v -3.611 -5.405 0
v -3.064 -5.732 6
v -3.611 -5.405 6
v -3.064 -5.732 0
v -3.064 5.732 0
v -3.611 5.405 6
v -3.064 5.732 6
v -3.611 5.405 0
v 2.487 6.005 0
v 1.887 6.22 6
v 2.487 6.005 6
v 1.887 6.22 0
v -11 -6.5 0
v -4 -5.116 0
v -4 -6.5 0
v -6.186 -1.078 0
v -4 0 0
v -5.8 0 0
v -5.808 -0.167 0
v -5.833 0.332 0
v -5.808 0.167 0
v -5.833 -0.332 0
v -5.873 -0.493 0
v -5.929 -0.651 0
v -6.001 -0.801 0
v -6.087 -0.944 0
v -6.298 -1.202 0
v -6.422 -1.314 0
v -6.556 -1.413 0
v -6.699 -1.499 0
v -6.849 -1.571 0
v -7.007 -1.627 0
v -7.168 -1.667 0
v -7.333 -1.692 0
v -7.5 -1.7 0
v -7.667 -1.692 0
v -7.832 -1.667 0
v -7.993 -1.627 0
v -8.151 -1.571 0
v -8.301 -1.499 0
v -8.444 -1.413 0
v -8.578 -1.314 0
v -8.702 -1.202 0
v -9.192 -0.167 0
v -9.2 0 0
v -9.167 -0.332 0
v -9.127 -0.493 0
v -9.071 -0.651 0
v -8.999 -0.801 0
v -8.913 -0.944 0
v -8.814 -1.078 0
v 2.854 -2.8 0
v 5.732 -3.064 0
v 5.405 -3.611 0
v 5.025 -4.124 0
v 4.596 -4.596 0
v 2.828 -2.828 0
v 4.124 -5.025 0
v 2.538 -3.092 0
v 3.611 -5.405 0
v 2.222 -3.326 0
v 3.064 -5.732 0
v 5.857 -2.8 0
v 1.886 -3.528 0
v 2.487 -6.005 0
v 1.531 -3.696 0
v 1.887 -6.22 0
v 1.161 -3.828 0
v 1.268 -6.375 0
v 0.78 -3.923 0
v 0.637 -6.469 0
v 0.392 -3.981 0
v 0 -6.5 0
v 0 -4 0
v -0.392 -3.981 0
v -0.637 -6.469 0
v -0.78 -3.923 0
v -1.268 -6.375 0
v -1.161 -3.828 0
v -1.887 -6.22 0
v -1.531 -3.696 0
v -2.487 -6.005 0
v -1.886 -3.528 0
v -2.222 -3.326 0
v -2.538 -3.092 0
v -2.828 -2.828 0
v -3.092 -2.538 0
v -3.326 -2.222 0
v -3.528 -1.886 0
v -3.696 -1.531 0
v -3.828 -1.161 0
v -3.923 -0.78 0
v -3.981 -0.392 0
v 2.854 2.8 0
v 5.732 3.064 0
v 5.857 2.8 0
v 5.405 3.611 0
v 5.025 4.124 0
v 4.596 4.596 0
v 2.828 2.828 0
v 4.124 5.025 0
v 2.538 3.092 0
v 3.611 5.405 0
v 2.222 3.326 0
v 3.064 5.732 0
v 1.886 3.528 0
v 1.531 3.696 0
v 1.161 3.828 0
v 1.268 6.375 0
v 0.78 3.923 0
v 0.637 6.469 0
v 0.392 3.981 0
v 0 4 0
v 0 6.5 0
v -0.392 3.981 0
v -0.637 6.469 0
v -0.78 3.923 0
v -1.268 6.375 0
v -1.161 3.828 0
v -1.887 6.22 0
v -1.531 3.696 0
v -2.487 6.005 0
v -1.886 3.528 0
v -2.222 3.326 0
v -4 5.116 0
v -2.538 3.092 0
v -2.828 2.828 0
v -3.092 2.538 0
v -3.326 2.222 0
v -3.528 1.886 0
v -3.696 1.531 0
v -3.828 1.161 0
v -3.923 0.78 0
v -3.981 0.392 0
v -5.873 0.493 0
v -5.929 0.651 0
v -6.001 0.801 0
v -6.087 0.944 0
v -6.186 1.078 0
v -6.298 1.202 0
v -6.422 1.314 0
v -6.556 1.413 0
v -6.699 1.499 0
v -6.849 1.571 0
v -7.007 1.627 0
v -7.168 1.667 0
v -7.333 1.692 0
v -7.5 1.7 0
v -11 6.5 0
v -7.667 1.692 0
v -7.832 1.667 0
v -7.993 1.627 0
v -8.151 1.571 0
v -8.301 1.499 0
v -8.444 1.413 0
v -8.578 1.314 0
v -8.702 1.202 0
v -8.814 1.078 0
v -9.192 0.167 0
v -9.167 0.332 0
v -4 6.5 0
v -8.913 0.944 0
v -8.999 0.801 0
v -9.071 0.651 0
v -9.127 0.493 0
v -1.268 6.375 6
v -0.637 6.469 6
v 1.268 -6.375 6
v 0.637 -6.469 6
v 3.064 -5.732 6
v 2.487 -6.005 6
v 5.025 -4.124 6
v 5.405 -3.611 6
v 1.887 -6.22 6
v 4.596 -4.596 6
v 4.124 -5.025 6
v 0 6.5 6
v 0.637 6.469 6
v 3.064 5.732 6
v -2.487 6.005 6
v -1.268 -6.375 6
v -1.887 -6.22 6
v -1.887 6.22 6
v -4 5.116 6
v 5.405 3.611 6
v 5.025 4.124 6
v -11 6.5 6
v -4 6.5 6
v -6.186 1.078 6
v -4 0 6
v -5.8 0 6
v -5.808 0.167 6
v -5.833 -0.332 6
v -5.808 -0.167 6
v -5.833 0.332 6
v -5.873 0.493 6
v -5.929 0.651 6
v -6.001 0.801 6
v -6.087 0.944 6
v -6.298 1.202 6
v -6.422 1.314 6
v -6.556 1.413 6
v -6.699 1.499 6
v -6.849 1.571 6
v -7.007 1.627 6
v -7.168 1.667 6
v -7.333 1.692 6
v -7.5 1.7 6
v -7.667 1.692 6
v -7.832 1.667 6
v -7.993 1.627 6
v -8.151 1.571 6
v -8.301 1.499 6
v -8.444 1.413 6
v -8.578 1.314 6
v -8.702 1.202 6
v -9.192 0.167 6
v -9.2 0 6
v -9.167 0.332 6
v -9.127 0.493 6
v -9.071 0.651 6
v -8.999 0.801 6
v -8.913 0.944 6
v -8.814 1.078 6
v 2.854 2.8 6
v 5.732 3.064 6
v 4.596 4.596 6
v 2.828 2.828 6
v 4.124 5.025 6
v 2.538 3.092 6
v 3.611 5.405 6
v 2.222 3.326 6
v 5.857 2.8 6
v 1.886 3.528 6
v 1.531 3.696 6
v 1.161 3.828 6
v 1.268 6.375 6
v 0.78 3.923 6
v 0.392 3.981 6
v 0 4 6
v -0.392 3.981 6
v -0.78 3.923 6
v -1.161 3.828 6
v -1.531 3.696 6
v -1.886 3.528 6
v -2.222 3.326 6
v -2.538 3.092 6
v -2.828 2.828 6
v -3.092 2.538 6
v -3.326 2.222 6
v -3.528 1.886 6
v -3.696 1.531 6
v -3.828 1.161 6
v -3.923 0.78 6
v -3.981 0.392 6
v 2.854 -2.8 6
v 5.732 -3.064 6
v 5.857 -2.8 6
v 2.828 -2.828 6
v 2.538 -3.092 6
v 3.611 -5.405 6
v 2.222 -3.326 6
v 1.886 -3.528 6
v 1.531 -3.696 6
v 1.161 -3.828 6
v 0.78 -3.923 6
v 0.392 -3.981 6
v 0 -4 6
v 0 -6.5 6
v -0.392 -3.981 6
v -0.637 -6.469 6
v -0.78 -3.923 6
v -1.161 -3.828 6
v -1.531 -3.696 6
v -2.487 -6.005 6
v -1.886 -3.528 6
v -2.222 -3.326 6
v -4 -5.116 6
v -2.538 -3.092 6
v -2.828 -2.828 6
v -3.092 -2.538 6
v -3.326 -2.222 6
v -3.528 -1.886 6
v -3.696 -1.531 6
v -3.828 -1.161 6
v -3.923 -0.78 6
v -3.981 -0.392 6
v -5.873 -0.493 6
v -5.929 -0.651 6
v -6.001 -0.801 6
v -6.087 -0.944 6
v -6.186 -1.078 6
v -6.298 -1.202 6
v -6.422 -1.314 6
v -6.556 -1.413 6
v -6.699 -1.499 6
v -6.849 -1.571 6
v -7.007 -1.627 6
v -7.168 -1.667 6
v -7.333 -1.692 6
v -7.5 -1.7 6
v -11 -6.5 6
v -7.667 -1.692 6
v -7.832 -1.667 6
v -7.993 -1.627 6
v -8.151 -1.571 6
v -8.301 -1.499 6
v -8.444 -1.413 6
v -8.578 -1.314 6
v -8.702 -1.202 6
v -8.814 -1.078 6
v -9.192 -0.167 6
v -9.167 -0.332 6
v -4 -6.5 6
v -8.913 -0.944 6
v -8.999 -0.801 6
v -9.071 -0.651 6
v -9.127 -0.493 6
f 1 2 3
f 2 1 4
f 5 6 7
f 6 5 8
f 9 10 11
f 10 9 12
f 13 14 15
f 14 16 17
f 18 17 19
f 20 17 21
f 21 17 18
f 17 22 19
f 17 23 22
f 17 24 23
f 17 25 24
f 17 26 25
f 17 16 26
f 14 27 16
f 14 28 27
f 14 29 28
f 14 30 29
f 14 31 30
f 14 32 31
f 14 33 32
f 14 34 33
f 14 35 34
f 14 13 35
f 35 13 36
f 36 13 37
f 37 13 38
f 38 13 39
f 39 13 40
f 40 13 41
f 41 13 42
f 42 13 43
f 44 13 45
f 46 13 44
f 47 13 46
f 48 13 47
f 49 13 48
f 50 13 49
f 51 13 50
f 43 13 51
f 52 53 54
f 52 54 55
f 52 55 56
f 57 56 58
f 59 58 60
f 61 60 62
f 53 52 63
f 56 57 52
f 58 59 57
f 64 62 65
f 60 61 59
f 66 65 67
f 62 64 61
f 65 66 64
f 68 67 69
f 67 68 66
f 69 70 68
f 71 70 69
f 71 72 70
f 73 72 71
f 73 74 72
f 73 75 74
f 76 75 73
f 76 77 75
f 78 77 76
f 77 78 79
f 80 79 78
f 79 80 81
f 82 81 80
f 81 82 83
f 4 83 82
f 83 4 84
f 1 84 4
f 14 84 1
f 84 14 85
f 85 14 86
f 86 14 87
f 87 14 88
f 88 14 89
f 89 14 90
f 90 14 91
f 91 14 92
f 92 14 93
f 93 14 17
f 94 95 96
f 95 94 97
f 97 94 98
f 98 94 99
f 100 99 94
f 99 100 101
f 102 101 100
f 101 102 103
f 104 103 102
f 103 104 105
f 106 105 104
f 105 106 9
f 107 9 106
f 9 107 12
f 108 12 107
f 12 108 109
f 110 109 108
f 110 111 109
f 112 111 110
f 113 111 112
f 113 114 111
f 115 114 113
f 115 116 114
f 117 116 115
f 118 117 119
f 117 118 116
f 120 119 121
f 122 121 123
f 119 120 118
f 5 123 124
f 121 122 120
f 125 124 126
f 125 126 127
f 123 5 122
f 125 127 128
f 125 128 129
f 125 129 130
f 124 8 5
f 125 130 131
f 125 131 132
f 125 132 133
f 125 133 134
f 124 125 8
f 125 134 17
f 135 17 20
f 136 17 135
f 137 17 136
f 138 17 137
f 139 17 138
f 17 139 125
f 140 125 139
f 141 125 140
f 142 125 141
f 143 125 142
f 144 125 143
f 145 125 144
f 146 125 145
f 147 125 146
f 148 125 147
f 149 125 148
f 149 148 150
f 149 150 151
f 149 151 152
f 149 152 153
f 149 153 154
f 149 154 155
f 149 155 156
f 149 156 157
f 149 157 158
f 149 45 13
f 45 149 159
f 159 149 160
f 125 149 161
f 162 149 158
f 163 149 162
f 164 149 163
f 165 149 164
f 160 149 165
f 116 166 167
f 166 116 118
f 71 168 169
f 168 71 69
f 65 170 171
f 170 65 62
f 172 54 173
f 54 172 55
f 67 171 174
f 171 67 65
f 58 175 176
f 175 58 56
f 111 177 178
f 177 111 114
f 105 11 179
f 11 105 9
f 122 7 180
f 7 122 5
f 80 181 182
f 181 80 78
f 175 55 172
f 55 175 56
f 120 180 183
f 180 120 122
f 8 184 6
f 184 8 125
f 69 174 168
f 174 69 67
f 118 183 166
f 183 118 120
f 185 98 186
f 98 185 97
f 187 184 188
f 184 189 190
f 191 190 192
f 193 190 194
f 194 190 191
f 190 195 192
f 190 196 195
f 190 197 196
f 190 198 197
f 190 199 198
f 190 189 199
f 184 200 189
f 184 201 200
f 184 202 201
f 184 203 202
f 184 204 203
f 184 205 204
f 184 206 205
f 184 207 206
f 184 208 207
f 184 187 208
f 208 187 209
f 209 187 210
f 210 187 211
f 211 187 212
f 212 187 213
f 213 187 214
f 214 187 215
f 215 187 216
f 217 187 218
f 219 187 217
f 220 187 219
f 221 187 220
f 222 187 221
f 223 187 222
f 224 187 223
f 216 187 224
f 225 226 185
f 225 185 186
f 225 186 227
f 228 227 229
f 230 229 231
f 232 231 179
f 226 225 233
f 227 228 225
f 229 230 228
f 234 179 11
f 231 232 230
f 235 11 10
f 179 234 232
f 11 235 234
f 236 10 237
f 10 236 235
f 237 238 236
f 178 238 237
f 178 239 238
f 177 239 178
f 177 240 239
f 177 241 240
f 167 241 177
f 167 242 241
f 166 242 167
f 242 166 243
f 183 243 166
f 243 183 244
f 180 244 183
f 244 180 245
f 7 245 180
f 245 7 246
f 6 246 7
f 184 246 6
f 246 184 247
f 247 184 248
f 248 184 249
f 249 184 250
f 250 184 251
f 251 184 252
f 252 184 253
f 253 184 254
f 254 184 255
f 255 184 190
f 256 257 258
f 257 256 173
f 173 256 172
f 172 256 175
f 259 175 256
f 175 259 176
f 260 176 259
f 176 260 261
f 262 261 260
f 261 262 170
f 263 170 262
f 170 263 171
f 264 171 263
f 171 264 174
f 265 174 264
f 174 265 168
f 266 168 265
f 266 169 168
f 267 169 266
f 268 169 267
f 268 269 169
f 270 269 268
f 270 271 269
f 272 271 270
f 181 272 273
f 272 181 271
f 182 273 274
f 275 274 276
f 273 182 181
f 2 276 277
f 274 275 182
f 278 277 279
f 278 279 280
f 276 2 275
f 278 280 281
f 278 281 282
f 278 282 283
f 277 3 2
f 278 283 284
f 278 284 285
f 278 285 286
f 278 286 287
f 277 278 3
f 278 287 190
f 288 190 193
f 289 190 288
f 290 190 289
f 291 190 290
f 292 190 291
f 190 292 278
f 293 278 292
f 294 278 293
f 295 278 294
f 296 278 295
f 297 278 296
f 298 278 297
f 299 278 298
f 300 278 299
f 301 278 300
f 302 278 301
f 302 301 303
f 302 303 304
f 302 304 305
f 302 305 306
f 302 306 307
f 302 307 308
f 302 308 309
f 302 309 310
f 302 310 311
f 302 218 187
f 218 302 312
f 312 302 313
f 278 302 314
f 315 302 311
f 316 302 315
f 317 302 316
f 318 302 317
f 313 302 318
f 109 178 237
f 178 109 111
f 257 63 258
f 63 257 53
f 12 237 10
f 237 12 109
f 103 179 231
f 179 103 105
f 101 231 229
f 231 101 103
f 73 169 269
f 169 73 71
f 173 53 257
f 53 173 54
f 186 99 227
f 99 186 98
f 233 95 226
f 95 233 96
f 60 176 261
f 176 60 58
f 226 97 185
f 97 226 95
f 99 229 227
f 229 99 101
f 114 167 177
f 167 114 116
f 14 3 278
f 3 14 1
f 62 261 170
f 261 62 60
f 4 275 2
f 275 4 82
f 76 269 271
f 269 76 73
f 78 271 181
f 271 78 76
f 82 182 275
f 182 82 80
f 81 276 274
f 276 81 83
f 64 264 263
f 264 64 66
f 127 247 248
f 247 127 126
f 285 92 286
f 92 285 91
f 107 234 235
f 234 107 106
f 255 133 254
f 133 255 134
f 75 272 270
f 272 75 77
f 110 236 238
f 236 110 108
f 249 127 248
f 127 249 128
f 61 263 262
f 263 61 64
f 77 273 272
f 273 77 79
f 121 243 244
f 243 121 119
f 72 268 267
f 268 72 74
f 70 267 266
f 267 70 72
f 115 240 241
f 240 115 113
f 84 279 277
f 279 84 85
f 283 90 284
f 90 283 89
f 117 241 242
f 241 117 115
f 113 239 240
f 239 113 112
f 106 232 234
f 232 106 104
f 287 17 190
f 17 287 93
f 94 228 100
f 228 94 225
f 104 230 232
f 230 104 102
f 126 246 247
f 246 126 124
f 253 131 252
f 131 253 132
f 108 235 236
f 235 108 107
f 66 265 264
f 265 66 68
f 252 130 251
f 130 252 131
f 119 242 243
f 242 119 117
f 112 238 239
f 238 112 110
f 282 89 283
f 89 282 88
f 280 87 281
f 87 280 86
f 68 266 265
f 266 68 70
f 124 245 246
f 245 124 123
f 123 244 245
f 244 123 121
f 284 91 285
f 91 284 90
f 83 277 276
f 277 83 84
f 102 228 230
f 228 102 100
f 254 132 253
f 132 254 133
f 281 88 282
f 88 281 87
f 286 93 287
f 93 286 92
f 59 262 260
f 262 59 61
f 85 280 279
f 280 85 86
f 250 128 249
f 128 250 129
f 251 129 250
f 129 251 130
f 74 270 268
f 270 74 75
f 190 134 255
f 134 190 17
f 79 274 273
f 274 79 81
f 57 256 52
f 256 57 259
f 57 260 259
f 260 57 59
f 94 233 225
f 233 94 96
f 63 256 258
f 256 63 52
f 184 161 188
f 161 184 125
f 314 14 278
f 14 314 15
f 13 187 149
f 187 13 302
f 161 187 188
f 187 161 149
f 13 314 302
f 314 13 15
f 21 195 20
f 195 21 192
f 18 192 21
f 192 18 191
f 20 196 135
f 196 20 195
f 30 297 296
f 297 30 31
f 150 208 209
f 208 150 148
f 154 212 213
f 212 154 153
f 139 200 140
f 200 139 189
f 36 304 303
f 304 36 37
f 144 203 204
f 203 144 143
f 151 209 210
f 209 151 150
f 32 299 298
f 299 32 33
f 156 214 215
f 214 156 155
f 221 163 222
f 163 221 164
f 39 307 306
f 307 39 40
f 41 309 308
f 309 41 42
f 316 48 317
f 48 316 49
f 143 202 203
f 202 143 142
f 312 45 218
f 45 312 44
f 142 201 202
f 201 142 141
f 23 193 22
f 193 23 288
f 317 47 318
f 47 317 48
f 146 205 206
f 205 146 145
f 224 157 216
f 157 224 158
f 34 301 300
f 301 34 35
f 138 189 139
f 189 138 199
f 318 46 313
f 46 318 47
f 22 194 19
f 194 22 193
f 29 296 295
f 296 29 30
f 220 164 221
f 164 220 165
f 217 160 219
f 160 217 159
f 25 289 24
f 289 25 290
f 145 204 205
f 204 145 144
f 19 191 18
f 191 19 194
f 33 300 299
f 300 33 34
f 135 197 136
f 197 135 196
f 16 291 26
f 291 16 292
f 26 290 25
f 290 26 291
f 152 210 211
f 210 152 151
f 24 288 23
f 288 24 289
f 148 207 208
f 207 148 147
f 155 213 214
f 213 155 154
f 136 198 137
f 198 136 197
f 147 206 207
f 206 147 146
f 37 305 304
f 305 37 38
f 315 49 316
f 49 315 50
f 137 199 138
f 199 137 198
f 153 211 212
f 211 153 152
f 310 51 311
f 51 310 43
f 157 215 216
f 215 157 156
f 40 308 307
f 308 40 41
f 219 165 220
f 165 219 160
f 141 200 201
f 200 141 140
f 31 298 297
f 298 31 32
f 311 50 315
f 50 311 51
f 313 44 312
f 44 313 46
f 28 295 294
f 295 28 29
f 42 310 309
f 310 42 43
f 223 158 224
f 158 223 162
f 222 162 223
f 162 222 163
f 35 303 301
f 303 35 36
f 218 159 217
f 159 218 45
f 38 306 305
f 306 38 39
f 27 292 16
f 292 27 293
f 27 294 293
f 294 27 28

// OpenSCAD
// file: ../lib/utils.scad
// 공통 모듈 (common modules) — 베어링 시트, 볼트 홀 등
include <../config/parameters.scad>

// 베어링 시트 (bearing seat): 압입 공차 적용 포켓
// brg = [내경, 외경, 폭] (예: BRG_608ZZ)
module bearing_seat(brg) {
    cylinder(d = brg[1] + bearing_press_fit, h = brg[2]);
}

// 베어링 시트 + 내륜 도피 홀 (관통)
// wall = 시트 아래 받침 두께
module bearing_pocket(brg, wall = 2) {
    union() {
        translate([0, 0, wall]) bearing_seat(brg);
        // 내륜 접촉 방지: 내경보다 크고 외경보다 작은 도피 홀
        cylinder(d = (brg[0] + brg[1]) / 2, h = wall + 0.1);
    }
}

// 관통 볼트 홀 (clearance hole)
module bolt_hole(d, h) {
    cylinder(d = d + bolt_hole_oversize, h = h);
}

// NEMA 17 모터 마운트 홀 패턴 (CON-004: SF24 = 42각 NEMA 17 호환)
// h = 판 두께
module nema17_mount(h) {
    union() {
        cylinder(d = nema17_pilot_d + clearance_fit, h = h);
        for (x = [-1, 1], y = [-1, 1])
            translate([x * nema17_hole_pitch / 2, y * nema17_hole_pitch / 2, 0])
                bolt_hole(nema17_bolt_d, h);
    }
}

// 숄더 볼트 피벗 홀 (CON-001)
// d = 숄더 직경 (shoulder_d_small | shoulder_d_large)
module pivot_hole(d, h) {
    cylinder(d = d + clearance_fit, h = h);
}

// 베어링 보스 (bearing boss): 출력물 허브에 베어링 내경 직접 안착 (CON-003)
// 내경 기준 압입 — bearing_press_fit(음수)만큼 키운다
module bearing_boss(brg, h) {
    cylinder(d = brg[0] - bearing_press_fit, h = h);
}

// 육각 너트 포켓 (nut pocket) — 차집합용. af = 평면폭(across flats)
module nut_pocket(af, t) {
    cylinder(d = (af + clearance_fit) / cos(30), h = t, $fn = 6);
}

// 리미트 스위치 장착 홀 쌍 (ELE-004) — 차집합용, X축 방향 피치
module ls_mount_holes(h) {
    for (x = [-1, 1])
        translate([x * ls_hole_pitch / 2, 0, 0])
            cylinder(d = ls_hole_d, h = h);
}

// 케이블 가이드 클립 (ELE-005) — 외면 부착형 C-클립, cable_d 다발 직경
module cable_clip(cable_d = 8, t = 4) {
    wall = 2.5;
    difference() {
        cylinder(d = cable_d + 2 * wall, h = t);
        translate([0, 0, -0.1]) cylinder(d = cable_d, h = t + 0.2);
        // 삽입 개구 (개구 폭 = 케이블 직경의 70%)
        translate([0, -cable_d * 0.35, -0.1])
            cube([cable_d, cable_d * 0.7, t + 0.2]);
    }
}

// 평행/구동 링크 바 (625ZZ 양단, MEC-002/MEC-001a)
// len = 피벗 간 거리. 보스 상면에서 베어링 압입, 하면 내륜 도피 홀.
module link_bar(len) {
    boss_t = BRG_625ZZ[2] + 4;
    difference() {
        union() {
            translate([0, -link_bar_w / 2, (boss_t - link_bar_t) / 2])
                cube([len, link_bar_w, link_bar_t]);
            for (x = [0, len])
                translate([x, 0, 0]) cylinder(d = link_boss_d, h = boss_t);
        }
        for (x = [0, len]) {
            translate([x, 0, boss_t - BRG_625ZZ[2]])
                bearing_seat([BRG_625ZZ[0], BRG_625ZZ[1], BRG_625ZZ[2] + 0.1]);
            translate([x, 0, -0.1])
                cylinder(d = (BRG_625ZZ[0] + BRG_625ZZ[1]) / 2, h = boss_t + 0.2);
        }
    }
}

// 지시선(leader) + 빌보드(billboard) 라벨 — 프리뷰용, $vpr 카메라 추종
// p = 앵커(부품 측), v = 지시선 벡터 (라벨은 p+v 위치)
// 주의: 상위 프레임이 회전된 경우 빌보드가 카메라를 향하지 않음 — 월드 프레임에서 호출할 것
module leader_label(p, v, txt, size = 3.2, col = "white") {
    color(col) {
        hull() {
            translate(p) sphere(d = 1.4, $fn = 12);
            translate(p + v) sphere(d = 1.4, $fn = 12);
        }
        translate(p + v) rotate($vpr) translate([2, -size / 2, 0])
            linear_extrude(0.6) text(txt, size = size);
    }
}

// 축 클램프 슬릿 + M3 핀치 볼트 (차집합용)
// bore_d = 클램프 보어, depth = 보어 깊이, body_d = 보스 외경
module shaft_clamp_cut(bore_d, depth, body_d) {
    union() {
        cylinder(d = bore_d + clearance_fit / 2, h = depth);
        // 슬릿
        translate([-1, 0, -0.1]) cube([2, body_d / 2 + 1, depth + 0.1]);
        // M3 핀치 볼트 (슬릿 직교) — 보어 반경과 보스 반경 사이
        translate([0, (bore_d / 2 + body_d / 2) / 2 + 1, depth / 2])
            rotate([0, 90, 0])
                translate([0, 0, -body_d / 2 - 1])
                    bolt_hole(3, body_d + 2);
    }
}
// file: ../config/parameters.scad
// cobot-lite 전역 파라미터 (global parameters)
// 모든 부품 치수는 이 파일에서만 정의한다 — 매직 넘버 하드코딩 금지 (MEC-008)

/* ===== 출력/렌더링 ===== */
$fn = 64;

/* ===== 공통 가공 여유 (파생 치수에서 참조 — 선행 정의 필수) ===== */
clearance_fit = 0.3;      // 회전/슬라이드 끼움 여유
bolt_hole_oversize = 0.4; // 관통 볼트 홀 여유

/* ===== 베어링 (bearing) — CON-002: 이 4종만 사용 =====
   [내경, 외경, 폭] mm */
BRG_608ZZ  = [8,  22, 7];   // 관절 피벗 (8mm 숄더 볼트)
BRG_625ZZ  = [5,  16, 5];   // 평행 링크 피벗 (5mm 숄더 볼트)
BRG_6805ZZ = [25, 37, 7];   // 손목 롤 축, 중구경 허브
BRG_6810ZZ = [50, 65, 7];   // 베이스 턴테이블 메인 베어링

// 베어링 압입 공차 (press-fit tolerance) — MFG-002
// 외경 기준 -0.1 ~ -0.2mm. 프린터별 보정은 이 변수 하나로 조정한다.
bearing_press_fit = -0.15;

/* ===== 숄더 볼트 (stripper/shoulder bolt) — CON-001 ===== */
shoulder_d_small = 5;   // 625ZZ 결합
shoulder_d_large = 8;   // 608ZZ 결합

/* ===== 링크 길이 — MEC-006 [TBD-4] =====
   리치 500mm 잠정. 비대칭 분할 (J2 자중 부담 보상, MEC-001a 분담 구조) */
L1 = 225;   // 상완 (upper arm): J2 축 → J3 축
L2 = 275;   // 하완 (forearm): J3 축 → 공구 플랜지

/* ===== 링크 꺾임 (팔레타이저식 구조 오프셋) =====
   관절 축 좌표는 불변(직선 L1/L2 기준) — 꺾임은 빔 형상만 변경.
   목적: ① 신장/접힘 한계 자세에서 빔-빔 간섭 여유 확보
        ② 구조 외곽을 축선 위로 올려 저자세 작업 시 팔꿈치 하부 돌출 감소
   니(knee) 수직 오프셋 h = L·pos·(1-pos)·tan(deg) */
ua_bend_deg = 12;     // 상완 꺾임각 (0 = 직선)
ua_bend_pos = 0.68;   // 꺾임 위치 (0~1, J2 기준) — 분할 조인트(95~131) 뒤
fa_bend_deg = 12;     // 하완 꺾임각
fa_bend_pos = 0.5;    // 꺾임 위치 (팔꿈치 기준)

/* ===== 가동 엔벨로프 (소프트 리미트 권고값 — docs/design-notes.md) =====
   접힘각 = J3 - J2 (월드 피치 차).
   -90° = 평행사변형 구동 전동각(transmission angle) 특이점 (크랭크∥링크),
     0° = 완전 신장 특이점 (J2·J3·손목 일직선). 양쪽 모두 운용 금지 */
env_fold_min = -75;   // 접힘 한계 (전동각 sin25° ≈ 0.42 이상 확보)
env_fold_max = -3;    // 신장 한계 (리치 ≈ 499.5mm — 공칭 500 대비 -0.5)

// J3 모터 후방 배치 연장 길이 (MEC-001c)
// J2 액추에이터는 J2 축 동축 직결 (MEC-001b) — 후방 배치 대상은 J3 어셈블리만
// J1 회전 시 베이스·작업물 간섭 확인 필수
rear_extension = 80;    // J2 피벗 → J3 모터+기어박스 어셈블리 중심 [잠정]

/* ===== 턴테이블 (turntable) — MEC-003 ===== */
turntable_bearing_gap = 30;   // 6810ZZ 2개 축방향 이격, 30mm 이상 (SHOULD)

/* ===== 모터 (motor) — CON-004: 산요덴키 SF24 시리즈 =====
   NEMA 17 호환 42각 */
motor_frame = 42;             // 프레임 폭 (mm)
nema17_hole_pitch = 31;       // 고정 볼트 피치
nema17_pilot_d = 22;          // 센터 파일럿 직경
nema17_bolt_d = 3;            // M3

/* ===== 감속비 (gear ratio) — CON-005: 5/10/20만 허용 ===== */
// 주의: MG17-G10(10:1)은 허용 토크 5N·m로 급락 — 변경 시 토크 재검증 (docs/torque-budget.md)
ratio_J1 = 20;
ratio_J2 = 20;
ratio_J3 = 20;   // SF2423 + 20:1 확정 (TBD-3 해결)
ratio_J4 = 5;

/* ===== 기어박스 (gearbox) — MG17 데이터시트 (docs/tbd-research.md TBD-5) ===== */
gbx_frame = 42;            // NEMA 17 플랜지, 모터와 동일 42각
gbx_len_20to1 = 51;        // MG17-G20 길이 (J1~J3)
gbx_len_5to1  = 40;        // MG17-G5 길이 (J4)
gbx_out_shaft_d = 8;       // 출력축 직경
gbx_in_insert = 9.5;       // 입력 결합 깊이 — SF24 축 길이 호환 확인 항목
gbx_mass_20to1 = 400;      // g — 질량 예산 계산용
gbx_mass_5to1  = 350;      // g

/* ===== 모터 몸체 치수 — SF24 카탈로그 일반값 [잠정: 구매 데이터시트로 확인] ===== */
motor_len_SF2424 = 47;    // J1, J2
motor_len_SF2423 = 39;    // J3
motor_len_SF2422 = 33;    // J4
motor_shaft_d = 5;        // SF24 출력축 (MG17 입력 클램프 ⌀5)
gbx_out_shaft_len = 20;   // MG17 출력축 돌출 길이

/* ===== 베이스/J1 (MEC-003, MEC-005) ===== */
base_plate_size = 140;    // 정사각 베이스 플레이트 한 변
base_plate_t = 8;
base_bolt_d = 5;          // M5 ×4 작업대 고정 (MEC-005)
base_bolt_pitch = 120;    // 고정 볼트 피치
base_col_wall = 5;        // 턴테이블 칼럼 벽 두께
col_window_w = 50;        // 칼럼 측면 배선/조립 창 폭
turntable_top_d = 100;    // 턴테이블 상판 직경
turntable_top_t = 8;
j1_actuator_gap = 4;      // 베이스 플레이트 상면 → 모터 하면 여유
col_open_h = 24;          // 모터 플로어 상면 → 하부 베어링 (스템 결합·셋스크류 존)
j1_stem_d = 20;           // 턴테이블 허브 스템(출력축 결합부) 외경
set_screw_pilot_d = 3.4;  // M4 무두 볼트(set screw) 셀프태핑 파일럿
m3_tap_d = 2.8;           // M3 셀프태핑 파일럿 (앵커 등 소형 체결)
shoulder_mount_px = 80;   // 어깨 텅 ↔ 턴테이블 볼트 피치 X
shoulder_mount_py = 50;   // 어깨 텅 ↔ 턴테이블 볼트 피치 Y
shoulder_mount_bolt_d = 5;// M5 ×4
shoulder_tongue_x = 40;   // 어깨 텅 깊이(X) — 포크 내 스윕 간섭 한계 결정 (J2 ≈ ±55°)

/* ===== 암 단면/관절 (MEC-004) — v0.13 플레이트 아키텍처 =====
   원칙: 출력물은 평판(plate)만. 간격은 표준 스페이서 튜브 + 관통 볼트가
   결정 (일체 보스·웹·박스 금지). 관절 베어링은 플레이트에 직접 압입 —
   플레이트 두께 = 608ZZ 폭(7) */
arm_plate_t = 7;          // 측판 두께 = 608ZZ 폭 (베어링 인-플레이트 압입)
fork_standoff_len = 30;   // 표준 육각 스탠드오프 길이 (어깨 포크 갭 = 하완 내폭)
hex_standoff_af = 13;     // 두꺼운 육각 스탠드오프 평면폭 (M6 암-암)
joint_spacer_od = 12;     // 관절 스택 스페이서 튜브 외경 (숄더 ⌀8 위)
ua_split_x = 115;         // 상완 플레이트 분할선 (365 > 빌드 대각 한계)
ua_splice = [99, 131];    // 스플라이스 더블러 볼트 X 위치 (분할선 ±16)
// 어깨 텅(플레이트 스택) 폭 = 플레이트 14 ×2 + 표준 스탠드오프 30 (v0.13)
tongue_w = 28 + fork_standoff_len;          // 58
// 상완 포크 내폭 = 표준 육각 스탠드오프 L60 (전 스탠드오프 표준화 — v0.14).
// 텅 58과의 편차 1mm/측은 J2 스택 M8 와셔가 흡수 (CON-001 와셔 기존 품목)
arm_inner_w = 60;
arm_h = 50;               // 암 단면 높이
j2_axis_h = 90;           // 턴테이블 상면 → J2 축 높이
                          // — J2 +45° 시 후방 러그 하단 ↔ 어깨 플랜지 간섭 회피 (간섭 검사 확인)
j3_crank_len = 40;        // J3 크랭크 = 하완 혼 반경 (평행사변형 1:1)
pl_offset = 45;           // 수동 평행사변형(MEC-002) 피벗 오프셋
                          // — J2 모터 42각 코너 스윕 반경(≈30) + 여유
forearm_inner_w = fork_standoff_len;  // 하완 측판 내폭 = 표준 스탠드오프 30 (v0.13)
beam_w = 40;              // 상완/하완 중앙 보(beam) 폭
arm_lug_r = 26;           // 관절 러그(피벗 보스) 반경 — NEMA17 볼트 코너(r≈21.9) + 벽
beam_wall = 4;            // 보 쉘 벽 두께 (경량화)
pivot_engage = 14;        // 축 클램프/베어링 물림 깊이
crank_t = 8;              // J3 크랭크 암 두께
crank_hub_d = 20;         // 크랭크 허브 외경
crank_hub_w = 12;         // 크랭크 허브 폭
dl_offset = 8;            // 구동 링크 평면: 플레이트 A 외면 → 링크 중심 거리
ua_joint_x = 95;          // 상완 분할 조인트 위치 (MFG-004: 365mm > 빌드 대각 한계)
ua_lap = 36;              // 랩 조인트(소켓-테논) 물림 길이

/* ===== 너트 평면폭 (across flats) ===== */
m3_nut_af = 5.5;
m4_nut_af = 7;
m6_nut_af = 10;
link_bar_w = 12;          // 링크 바 단면 폭
link_bar_t = 6;           // 링크 바 단면 두께
link_boss_d = 24;         // 링크 단부 625ZZ 보스 외경 (625 외경 16 + 벽 4×2)

/* ===== 손목/공구 플랜지 (GEN-004) ===== */
wrist_offset = 50;        // 손목 피치 피벗 → J4(플랜지) 축 수평 오프셋
                          // — J4 모터 몸체 ↔ 하완 러그 스윕 간섭 회피 (≥ lug_r + 모터 반폭)
forearm_len = L2 - wrist_offset; // 팔꿈치 축 → 손목 피치 피벗
wrist_wall = 5;           // 손목 하우징 벽 두께
flange_d = 45;            // 공구 플랜지 직경
flange_t = 8;
flange_bc = 32;           // 그리퍼 볼트 서클
flange_bolt_d = 4;        // M4 ×4

/* ===== 리미트 스위치 (ELE-004) — KW12형 기계식 마이크로 기준품 ===== */
ls_body = [20, 10, 6.5];  // 몸체 [길이, 높이, 두께]
ls_hole_pitch = 9.5;      // 장착 홀 피치
ls_hole_d = 2.3;          // M2 셀프태핑/볼트

/* ===== 질량 산출 (MEC-007, docs/mass-budget.md) ===== */
petgcf_density = 1.30;    // g/cm³ (PETG-CF 카탈로그 일반값)
print_solidity = 0.6;     // 쉘+인필 유효 충전율 [잠정 — 슬라이서 추정으로 대체]
motor_mass_SF2424 = 510;  // g (산요 카탈로그 확정)
motor_mass_SF2423 = 380;
motor_mass_SF2422 = 300;

/* ===== 질량/성능 예산 ===== */
payload = 1.0;            // kg, 그리퍼 포함 정격 (PER-001)
moving_mass_budget = 0.8; // kg, 상완 이후 이동부 상한 (MEC-007)

/* ===== 출력 제약 — MFG-004 (Creality SparkX i7, TBD-8 해결) ===== */
build_volume = [260, 260, 255];
// main file
// 케이블 가이드 클립 (cable guide clip) — 관절 외부 배선 경로용 (ELE-005)
// 링크 외면에 M3 체결. 필요 수량은 BOM 참조 (상완·하완 각 2~3개).
include <../config/parameters.scad>
use <../lib/utils.scad>

module cable_clip_part(cable_d = 8) {
    difference() {
        union() {
            cable_clip(cable_d = cable_d, t = 6);
            // 체결 베이스
            translate([-cable_d / 2 - 7, -(cable_d / 2 + 2.5), 0])
                cube([7, cable_d + 5, 6]);
        }
        translate([-cable_d / 2 - 3.5, 0, -0.1]) bolt_hole(3, 6.2);
    }
}

cable_clip_part();
